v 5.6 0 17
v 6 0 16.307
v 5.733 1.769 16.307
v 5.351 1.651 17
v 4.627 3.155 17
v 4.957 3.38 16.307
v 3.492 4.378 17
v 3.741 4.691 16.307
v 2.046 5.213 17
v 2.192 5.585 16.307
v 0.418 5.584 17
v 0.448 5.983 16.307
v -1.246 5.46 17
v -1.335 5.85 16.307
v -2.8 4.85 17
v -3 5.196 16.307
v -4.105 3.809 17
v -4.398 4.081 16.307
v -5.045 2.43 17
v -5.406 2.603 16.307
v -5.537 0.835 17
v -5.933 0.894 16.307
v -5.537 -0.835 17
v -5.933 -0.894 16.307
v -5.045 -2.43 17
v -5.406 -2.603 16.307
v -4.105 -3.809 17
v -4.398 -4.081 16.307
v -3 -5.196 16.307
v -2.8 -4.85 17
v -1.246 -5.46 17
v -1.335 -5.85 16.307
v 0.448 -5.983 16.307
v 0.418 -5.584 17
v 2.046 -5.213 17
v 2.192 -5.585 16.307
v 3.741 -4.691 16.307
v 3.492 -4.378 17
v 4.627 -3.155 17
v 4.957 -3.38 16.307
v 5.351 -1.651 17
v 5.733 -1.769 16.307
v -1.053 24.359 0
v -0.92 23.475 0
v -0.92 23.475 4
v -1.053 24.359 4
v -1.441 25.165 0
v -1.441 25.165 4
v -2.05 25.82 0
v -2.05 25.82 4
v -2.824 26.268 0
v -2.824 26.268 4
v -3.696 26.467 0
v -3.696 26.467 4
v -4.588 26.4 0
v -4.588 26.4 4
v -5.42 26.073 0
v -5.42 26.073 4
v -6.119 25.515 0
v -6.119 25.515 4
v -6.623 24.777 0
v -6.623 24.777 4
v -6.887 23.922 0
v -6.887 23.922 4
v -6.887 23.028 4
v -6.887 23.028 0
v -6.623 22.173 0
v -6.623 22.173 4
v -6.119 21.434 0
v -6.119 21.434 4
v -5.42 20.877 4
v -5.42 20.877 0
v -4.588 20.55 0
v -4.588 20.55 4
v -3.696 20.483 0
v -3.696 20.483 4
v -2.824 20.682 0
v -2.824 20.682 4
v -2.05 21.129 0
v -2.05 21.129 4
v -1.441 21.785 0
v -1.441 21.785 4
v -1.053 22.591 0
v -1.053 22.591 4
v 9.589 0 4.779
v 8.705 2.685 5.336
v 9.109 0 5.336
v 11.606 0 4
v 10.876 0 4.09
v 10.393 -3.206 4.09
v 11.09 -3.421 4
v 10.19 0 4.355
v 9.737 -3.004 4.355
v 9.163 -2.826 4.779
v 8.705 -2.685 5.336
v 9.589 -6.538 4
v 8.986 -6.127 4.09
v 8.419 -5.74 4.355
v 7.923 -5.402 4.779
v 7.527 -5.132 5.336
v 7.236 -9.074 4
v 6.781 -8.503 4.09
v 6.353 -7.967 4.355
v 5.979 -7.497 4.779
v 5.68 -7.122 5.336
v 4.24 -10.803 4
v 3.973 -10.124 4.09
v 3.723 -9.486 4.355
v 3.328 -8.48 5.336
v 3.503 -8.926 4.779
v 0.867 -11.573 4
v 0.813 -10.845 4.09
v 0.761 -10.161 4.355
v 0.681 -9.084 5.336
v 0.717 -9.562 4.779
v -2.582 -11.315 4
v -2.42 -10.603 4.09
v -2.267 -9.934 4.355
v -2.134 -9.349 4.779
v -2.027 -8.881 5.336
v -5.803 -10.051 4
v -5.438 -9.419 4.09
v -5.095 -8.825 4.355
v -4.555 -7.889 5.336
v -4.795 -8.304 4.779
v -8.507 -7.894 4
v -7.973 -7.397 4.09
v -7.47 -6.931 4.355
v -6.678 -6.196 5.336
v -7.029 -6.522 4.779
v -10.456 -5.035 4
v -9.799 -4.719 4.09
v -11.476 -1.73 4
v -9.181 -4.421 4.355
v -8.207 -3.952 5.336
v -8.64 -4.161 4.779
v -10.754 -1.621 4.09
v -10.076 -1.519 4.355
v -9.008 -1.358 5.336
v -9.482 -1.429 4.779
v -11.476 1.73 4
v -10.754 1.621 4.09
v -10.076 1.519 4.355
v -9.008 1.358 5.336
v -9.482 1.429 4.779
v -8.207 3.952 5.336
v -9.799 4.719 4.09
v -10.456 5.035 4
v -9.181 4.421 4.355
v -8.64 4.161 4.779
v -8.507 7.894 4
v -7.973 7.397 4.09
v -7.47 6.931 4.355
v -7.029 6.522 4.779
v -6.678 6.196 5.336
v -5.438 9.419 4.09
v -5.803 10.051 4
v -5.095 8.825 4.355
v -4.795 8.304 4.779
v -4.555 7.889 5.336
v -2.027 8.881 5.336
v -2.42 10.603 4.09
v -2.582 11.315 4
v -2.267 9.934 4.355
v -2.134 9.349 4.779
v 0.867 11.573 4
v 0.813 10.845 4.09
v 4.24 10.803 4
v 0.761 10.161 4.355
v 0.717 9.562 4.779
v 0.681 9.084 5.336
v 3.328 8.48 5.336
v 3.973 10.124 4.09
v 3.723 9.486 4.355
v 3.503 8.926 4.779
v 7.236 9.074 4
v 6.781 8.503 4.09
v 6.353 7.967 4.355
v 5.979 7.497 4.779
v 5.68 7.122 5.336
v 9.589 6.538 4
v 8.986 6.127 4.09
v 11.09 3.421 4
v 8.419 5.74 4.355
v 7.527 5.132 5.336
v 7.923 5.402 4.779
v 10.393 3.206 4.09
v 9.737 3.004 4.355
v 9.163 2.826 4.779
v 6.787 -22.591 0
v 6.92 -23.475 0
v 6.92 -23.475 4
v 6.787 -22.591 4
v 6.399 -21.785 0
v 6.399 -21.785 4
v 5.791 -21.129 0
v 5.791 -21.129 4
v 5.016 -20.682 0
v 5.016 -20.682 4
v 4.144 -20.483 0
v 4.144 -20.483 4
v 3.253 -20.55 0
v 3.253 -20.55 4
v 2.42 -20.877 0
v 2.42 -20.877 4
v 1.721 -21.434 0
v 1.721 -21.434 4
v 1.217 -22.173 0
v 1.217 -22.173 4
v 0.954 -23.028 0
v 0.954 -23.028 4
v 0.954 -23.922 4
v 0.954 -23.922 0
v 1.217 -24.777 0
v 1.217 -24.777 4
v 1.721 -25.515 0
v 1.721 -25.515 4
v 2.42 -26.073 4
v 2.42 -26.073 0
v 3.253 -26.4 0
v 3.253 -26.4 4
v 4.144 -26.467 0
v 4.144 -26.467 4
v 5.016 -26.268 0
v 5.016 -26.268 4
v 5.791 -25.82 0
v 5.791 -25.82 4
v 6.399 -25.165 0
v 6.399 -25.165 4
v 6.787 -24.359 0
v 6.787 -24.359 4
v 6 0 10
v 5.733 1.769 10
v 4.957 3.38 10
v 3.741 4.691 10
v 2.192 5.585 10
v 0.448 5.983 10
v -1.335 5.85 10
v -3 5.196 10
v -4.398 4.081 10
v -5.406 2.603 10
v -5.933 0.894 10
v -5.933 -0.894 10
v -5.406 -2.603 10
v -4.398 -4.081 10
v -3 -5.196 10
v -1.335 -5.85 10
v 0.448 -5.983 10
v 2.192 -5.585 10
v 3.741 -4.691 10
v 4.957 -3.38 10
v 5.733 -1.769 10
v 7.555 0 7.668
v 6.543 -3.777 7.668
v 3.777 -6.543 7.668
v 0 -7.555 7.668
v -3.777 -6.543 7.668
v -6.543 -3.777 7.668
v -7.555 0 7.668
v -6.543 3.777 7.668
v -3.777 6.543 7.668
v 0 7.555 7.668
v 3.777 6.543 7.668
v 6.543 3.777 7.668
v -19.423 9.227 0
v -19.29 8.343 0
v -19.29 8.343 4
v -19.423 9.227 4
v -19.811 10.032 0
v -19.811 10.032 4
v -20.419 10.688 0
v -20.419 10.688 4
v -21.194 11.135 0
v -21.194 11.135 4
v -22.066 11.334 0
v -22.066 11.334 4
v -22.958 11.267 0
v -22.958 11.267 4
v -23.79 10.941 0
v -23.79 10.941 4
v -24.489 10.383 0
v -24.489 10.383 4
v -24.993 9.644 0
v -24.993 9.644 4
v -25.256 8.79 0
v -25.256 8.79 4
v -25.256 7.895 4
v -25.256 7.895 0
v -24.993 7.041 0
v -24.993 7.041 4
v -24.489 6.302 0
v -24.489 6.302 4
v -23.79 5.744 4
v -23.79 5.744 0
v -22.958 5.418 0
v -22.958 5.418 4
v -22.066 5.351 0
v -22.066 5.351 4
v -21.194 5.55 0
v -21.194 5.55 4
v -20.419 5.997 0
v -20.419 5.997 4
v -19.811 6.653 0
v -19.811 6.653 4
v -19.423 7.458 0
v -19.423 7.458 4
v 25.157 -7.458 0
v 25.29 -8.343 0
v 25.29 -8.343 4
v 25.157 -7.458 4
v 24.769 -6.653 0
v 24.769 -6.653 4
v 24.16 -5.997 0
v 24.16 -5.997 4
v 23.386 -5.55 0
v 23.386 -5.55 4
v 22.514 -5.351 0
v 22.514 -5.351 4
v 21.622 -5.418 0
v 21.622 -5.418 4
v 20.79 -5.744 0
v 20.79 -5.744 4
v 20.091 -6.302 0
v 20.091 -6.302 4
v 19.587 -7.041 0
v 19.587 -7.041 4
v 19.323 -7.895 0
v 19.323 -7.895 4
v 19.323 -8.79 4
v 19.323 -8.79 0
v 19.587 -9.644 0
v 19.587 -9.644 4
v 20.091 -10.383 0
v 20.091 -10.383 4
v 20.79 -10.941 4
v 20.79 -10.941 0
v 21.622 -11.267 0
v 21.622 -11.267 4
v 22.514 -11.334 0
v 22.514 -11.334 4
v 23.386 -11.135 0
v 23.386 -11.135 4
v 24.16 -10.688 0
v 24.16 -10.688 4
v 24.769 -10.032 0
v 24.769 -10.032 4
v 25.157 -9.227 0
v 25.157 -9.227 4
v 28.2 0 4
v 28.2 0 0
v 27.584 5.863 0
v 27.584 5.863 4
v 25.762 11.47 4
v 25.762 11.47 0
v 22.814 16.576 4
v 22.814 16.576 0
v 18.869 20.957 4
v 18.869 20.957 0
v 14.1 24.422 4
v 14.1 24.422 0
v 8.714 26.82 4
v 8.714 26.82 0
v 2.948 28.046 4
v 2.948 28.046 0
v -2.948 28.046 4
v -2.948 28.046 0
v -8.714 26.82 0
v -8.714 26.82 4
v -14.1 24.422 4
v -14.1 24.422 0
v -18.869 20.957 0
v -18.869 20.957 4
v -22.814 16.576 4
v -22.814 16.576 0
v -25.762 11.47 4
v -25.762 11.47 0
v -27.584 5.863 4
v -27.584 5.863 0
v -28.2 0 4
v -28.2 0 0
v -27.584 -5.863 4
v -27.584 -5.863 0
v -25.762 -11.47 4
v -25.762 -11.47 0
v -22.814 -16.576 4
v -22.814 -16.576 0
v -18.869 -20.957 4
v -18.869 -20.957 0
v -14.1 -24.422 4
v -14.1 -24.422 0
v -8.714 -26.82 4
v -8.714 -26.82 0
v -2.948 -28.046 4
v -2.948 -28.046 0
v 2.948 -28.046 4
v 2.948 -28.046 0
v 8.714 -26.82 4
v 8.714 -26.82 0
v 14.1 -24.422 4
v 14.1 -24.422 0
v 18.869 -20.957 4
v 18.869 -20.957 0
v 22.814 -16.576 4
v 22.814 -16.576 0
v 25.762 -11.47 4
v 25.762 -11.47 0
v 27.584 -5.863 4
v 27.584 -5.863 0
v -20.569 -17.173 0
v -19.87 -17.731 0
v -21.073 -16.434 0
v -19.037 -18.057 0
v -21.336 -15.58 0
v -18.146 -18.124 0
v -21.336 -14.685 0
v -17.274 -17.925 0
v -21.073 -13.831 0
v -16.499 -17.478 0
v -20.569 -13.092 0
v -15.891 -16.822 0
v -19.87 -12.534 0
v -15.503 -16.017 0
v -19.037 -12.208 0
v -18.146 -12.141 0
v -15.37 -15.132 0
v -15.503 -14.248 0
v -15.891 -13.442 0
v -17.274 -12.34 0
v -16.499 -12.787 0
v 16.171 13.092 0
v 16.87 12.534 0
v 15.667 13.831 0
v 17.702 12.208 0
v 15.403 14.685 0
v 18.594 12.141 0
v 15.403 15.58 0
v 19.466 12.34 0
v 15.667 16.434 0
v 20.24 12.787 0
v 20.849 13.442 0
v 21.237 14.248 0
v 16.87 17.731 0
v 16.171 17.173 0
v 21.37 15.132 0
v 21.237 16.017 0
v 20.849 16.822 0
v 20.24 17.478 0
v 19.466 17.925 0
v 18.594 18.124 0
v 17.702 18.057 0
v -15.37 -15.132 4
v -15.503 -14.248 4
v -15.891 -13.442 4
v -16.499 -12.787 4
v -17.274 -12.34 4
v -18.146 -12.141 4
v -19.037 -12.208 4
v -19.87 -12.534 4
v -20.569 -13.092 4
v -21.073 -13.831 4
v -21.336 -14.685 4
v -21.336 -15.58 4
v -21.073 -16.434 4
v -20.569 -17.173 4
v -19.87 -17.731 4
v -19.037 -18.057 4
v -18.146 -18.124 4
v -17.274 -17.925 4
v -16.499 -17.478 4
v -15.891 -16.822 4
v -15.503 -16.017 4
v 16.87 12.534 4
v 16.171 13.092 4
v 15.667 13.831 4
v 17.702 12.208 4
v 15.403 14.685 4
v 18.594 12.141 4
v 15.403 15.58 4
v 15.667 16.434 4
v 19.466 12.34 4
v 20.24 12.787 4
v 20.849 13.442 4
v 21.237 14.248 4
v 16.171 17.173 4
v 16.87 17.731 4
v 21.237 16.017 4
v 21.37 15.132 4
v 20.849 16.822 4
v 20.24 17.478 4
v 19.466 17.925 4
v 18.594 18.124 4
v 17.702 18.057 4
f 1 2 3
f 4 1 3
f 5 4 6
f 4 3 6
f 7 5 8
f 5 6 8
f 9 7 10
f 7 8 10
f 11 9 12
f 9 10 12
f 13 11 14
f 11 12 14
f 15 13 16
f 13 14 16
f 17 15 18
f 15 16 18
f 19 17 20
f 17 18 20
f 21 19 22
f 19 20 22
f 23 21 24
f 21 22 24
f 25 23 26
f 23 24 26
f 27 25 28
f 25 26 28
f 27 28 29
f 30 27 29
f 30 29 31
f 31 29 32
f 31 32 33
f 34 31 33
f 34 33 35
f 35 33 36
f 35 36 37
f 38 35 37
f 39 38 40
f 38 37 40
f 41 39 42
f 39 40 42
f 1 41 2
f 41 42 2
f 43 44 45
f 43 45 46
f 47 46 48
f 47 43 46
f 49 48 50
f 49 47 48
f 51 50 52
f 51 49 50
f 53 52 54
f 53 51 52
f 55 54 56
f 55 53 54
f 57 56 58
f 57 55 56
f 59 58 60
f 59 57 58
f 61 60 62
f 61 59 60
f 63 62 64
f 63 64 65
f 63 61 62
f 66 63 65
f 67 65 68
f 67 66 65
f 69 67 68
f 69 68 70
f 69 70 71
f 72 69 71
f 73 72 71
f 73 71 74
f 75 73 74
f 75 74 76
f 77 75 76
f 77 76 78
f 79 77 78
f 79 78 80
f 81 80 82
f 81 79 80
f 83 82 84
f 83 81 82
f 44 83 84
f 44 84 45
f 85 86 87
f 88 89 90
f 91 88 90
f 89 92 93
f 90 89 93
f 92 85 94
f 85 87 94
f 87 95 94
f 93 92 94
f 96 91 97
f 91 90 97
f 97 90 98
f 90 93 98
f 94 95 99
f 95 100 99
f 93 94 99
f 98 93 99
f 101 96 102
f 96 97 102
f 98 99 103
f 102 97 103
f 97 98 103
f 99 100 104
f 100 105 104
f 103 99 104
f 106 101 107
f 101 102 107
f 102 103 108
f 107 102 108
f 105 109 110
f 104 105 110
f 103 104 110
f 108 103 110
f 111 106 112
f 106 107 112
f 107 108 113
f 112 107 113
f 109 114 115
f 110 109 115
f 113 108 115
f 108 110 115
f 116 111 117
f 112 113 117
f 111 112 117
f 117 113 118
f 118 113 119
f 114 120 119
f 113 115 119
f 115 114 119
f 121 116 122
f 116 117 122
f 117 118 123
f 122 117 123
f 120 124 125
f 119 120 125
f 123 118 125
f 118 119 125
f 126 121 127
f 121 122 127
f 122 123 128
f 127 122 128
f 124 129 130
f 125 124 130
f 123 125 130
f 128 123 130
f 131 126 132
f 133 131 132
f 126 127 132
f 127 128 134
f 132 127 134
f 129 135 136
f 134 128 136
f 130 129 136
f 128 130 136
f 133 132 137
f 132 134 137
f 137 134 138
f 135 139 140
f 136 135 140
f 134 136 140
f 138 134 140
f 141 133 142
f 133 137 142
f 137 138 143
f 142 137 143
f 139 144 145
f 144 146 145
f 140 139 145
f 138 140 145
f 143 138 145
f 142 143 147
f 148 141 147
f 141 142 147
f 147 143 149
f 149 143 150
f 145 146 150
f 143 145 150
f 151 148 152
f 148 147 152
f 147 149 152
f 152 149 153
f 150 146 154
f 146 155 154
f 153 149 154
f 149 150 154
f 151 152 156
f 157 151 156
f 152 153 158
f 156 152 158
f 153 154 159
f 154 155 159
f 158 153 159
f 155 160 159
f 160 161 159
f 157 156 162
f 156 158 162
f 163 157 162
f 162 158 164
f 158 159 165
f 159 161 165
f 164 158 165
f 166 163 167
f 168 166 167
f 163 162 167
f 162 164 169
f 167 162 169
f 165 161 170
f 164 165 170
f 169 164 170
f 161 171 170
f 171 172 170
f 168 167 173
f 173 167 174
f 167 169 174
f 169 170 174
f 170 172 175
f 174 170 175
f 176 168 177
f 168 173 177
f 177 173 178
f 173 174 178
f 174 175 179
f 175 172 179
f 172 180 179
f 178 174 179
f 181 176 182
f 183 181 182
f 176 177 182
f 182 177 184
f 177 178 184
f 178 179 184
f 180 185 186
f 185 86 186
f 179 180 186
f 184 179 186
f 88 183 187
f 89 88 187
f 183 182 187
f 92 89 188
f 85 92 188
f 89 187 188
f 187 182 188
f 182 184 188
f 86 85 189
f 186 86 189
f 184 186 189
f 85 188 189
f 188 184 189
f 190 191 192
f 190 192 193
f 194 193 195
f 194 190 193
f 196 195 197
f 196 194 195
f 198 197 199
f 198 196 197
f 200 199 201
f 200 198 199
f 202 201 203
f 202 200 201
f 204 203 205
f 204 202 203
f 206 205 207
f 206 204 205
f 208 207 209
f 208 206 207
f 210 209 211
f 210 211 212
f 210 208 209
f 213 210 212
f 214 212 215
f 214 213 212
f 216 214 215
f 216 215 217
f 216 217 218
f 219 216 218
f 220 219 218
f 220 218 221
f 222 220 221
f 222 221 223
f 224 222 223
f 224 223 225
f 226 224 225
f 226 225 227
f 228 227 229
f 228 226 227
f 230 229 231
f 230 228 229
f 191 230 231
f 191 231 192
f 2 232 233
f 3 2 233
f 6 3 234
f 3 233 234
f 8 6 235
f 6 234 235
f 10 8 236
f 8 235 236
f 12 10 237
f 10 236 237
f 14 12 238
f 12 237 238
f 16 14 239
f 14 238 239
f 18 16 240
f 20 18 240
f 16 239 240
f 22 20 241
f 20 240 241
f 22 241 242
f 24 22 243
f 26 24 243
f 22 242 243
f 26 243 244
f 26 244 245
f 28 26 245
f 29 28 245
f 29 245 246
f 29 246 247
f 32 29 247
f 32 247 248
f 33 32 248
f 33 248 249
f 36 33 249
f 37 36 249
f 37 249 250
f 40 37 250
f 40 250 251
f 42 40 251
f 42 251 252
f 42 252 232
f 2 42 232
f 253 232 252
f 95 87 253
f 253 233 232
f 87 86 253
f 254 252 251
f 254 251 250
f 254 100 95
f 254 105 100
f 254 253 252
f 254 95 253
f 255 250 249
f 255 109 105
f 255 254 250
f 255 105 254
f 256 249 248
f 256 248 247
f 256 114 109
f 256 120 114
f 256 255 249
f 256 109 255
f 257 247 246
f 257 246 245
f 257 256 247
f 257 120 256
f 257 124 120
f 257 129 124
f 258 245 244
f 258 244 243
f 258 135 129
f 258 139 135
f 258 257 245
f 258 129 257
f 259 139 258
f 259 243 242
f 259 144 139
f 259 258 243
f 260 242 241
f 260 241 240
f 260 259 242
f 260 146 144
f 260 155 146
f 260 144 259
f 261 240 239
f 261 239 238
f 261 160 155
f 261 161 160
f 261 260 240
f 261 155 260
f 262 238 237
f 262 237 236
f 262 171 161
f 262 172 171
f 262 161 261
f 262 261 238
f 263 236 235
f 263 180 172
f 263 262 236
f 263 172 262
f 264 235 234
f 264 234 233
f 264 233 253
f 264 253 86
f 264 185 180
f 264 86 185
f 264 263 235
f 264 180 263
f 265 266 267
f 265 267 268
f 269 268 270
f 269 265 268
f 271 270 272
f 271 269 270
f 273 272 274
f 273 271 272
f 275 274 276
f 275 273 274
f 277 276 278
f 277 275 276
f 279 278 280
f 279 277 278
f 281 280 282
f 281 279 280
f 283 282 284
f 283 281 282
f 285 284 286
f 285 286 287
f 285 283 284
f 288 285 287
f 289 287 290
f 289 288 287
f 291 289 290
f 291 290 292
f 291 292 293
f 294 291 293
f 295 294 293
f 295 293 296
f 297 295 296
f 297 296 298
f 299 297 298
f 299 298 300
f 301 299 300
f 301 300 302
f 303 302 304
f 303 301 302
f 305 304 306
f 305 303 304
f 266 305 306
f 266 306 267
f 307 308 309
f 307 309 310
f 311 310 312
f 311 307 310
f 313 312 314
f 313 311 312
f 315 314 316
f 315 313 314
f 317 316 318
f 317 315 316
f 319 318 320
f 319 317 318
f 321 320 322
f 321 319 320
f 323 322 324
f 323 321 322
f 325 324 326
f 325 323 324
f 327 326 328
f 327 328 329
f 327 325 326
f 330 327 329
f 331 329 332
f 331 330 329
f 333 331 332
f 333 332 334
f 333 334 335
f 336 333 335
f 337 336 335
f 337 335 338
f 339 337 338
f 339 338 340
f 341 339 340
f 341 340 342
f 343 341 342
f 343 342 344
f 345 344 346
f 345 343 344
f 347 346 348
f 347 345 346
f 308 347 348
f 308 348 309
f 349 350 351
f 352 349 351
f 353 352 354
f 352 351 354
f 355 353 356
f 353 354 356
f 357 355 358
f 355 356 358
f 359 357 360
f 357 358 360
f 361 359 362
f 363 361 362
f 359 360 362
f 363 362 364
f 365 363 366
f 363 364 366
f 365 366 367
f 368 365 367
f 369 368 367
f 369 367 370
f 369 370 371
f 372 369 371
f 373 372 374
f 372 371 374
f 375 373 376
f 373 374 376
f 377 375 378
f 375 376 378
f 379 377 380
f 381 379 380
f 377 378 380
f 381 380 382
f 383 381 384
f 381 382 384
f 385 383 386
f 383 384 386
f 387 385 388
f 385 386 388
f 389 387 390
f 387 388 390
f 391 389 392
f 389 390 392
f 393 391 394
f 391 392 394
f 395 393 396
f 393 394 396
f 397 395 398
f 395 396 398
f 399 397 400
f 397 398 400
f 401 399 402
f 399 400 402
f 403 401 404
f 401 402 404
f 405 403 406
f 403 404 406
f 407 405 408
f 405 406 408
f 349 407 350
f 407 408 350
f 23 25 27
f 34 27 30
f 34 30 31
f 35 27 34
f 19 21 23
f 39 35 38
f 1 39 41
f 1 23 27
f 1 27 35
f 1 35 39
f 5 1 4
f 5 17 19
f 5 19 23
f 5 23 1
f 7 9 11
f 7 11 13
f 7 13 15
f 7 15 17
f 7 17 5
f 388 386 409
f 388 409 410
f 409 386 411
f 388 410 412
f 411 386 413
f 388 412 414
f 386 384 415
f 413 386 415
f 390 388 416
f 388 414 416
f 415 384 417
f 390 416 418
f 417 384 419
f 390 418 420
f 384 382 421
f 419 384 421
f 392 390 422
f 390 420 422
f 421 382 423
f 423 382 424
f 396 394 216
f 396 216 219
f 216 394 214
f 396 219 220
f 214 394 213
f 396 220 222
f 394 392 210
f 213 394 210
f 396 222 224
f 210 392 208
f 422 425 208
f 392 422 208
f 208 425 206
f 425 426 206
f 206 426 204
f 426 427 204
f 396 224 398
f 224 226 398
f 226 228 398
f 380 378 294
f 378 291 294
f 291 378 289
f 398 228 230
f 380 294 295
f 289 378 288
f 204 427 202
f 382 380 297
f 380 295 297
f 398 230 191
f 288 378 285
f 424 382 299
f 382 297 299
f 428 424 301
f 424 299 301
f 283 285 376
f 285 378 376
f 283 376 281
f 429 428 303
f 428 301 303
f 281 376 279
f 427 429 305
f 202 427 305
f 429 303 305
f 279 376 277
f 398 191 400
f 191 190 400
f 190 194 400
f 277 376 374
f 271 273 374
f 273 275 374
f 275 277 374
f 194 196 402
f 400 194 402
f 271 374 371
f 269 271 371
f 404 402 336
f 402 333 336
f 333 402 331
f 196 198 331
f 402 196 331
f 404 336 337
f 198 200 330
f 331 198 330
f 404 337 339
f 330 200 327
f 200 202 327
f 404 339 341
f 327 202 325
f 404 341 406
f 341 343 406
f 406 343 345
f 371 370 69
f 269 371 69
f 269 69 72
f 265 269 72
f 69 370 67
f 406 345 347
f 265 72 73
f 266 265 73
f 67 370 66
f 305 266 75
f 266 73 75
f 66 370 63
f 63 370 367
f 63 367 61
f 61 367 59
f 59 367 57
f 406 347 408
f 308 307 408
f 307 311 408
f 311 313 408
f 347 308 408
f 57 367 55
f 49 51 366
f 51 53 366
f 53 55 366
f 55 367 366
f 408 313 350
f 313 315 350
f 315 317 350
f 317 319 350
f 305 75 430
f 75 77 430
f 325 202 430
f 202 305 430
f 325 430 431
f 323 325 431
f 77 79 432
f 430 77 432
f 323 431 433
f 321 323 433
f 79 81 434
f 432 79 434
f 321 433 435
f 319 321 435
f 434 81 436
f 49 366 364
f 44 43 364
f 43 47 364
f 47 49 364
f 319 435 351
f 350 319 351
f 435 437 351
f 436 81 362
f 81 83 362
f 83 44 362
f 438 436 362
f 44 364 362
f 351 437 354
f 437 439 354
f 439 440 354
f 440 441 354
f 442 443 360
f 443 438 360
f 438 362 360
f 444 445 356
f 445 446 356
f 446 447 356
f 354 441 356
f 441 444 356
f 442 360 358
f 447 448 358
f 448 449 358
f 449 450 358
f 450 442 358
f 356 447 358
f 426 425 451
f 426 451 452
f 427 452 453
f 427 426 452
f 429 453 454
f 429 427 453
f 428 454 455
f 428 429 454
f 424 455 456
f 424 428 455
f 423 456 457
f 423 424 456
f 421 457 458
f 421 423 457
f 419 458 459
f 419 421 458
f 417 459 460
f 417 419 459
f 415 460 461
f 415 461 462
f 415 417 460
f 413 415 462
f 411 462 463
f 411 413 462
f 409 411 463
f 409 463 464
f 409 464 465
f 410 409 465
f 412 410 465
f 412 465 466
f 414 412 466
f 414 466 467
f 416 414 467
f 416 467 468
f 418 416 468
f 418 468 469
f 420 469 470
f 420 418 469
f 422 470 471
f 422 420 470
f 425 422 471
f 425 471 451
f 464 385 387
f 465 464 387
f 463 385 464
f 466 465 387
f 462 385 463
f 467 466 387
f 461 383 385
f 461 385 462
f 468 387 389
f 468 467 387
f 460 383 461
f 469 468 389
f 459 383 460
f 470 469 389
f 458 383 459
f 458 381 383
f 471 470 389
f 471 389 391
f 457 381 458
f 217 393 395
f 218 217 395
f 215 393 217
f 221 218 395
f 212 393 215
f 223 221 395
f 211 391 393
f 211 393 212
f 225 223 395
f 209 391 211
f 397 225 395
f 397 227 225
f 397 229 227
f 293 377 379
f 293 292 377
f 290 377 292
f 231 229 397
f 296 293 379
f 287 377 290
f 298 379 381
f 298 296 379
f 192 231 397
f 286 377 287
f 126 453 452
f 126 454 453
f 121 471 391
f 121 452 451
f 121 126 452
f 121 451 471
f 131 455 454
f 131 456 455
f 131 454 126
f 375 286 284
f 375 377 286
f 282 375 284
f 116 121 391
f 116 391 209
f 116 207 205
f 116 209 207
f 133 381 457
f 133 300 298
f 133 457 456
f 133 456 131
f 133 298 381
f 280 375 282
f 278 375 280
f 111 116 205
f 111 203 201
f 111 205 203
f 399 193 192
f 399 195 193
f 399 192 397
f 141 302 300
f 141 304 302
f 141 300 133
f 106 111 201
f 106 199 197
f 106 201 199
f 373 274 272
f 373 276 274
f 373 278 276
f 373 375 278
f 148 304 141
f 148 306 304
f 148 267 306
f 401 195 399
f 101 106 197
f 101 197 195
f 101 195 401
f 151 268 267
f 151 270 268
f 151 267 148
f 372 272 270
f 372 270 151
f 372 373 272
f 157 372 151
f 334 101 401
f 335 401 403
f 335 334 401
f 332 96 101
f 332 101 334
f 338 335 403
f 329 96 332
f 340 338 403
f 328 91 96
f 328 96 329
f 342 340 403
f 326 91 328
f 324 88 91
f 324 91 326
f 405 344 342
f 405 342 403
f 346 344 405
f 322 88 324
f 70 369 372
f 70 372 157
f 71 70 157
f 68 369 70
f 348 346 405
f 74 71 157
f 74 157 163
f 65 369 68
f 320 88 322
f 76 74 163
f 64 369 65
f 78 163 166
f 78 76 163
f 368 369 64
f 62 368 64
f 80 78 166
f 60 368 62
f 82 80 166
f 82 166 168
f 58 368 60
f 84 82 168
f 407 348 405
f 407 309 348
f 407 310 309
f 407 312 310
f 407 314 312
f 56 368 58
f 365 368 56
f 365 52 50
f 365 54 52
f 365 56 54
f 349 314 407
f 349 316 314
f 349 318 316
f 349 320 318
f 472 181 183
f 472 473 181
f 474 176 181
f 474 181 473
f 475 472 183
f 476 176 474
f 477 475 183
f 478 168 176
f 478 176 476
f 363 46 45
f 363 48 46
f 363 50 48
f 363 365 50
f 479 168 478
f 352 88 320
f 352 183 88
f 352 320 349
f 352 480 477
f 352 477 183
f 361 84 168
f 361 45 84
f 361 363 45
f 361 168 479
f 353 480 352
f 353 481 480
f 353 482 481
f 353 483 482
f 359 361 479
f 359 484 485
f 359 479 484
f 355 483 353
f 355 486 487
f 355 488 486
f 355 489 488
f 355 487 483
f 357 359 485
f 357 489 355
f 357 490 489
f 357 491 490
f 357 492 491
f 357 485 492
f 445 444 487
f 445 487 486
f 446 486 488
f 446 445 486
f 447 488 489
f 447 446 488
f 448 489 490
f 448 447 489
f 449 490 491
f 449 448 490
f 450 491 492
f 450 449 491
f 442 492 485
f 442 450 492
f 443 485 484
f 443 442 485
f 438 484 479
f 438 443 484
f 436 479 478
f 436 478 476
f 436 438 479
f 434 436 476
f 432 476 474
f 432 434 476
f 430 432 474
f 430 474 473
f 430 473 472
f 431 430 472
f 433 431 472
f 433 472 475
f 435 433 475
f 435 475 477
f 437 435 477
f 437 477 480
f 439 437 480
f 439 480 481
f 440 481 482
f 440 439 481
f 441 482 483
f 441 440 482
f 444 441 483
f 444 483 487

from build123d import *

# Parameters (mm, degrees)
SKETCH1_R           = 28.2
SKETCH1_R_2         = 3
BOSS_EXTRUDE1_DEPTH = 4
SKETCH1_5_R         = 6
BOSS_EXTRUDE3_DEPTH = 17
CHAMFER1_SIZE       = 6
CHAMFER1_SIZE2      = 4
FILLET3_R           = 3
CHAMFER3_SIZE       = 0.4
CHAMFER3_SIZE2      = 0.692820323


with BuildPart() as part:
    # Sketch1 → Boss-Extrude1 (new body)
    with BuildSketch(Plane.XY):
        Circle(SKETCH1_R)
        with Locations((-22.289967255, 8.342503208)):
            Circle(SKETCH1_R_2, mode=Mode.SUBTRACT)
        with Locations((-3.920163919, 23.474929496)):
            Circle(SKETCH1_R_2, mode=Mode.SUBTRACT)
        with Locations((18.369803336, 15.132426289)):
            Circle(SKETCH1_R_2, mode=Mode.SUBTRACT)
        with Locations((22.289967255, -8.342503208)):
            Circle(SKETCH1_R_2, mode=Mode.SUBTRACT)
        with Locations((3.920163919, -23.474929496)):
            Circle(SKETCH1_R_2, mode=Mode.SUBTRACT)
        with Locations((-18.369803336, -15.132426289)):
            Circle(SKETCH1_R_2, mode=Mode.SUBTRACT)
    extrude(amount=BOSS_EXTRUDE1_DEPTH)

    # Sketch1<5> → Boss-Extrude3 (add)
    with BuildSketch(Plane.XY):
        Circle(SKETCH1_5_R)
    extrude(amount=BOSS_EXTRUDE3_DEPTH)

    # Chamfer1
    chamfer1_edges = [part.edges().sort_by_distance(p)[0] for p in [
        (-6, 0, 4),
    ]]
    chamfer1_side = [part.faces().sort_by_distance(p)[0] for p in [
        (-6, 0, 10.5),
    ]]
    chamfer(chamfer1_edges, length=CHAMFER1_SIZE, length2=CHAMFER1_SIZE2, reference=chamfer1_side[0])

    # Fillet3
    fillet3_edges = [part.edges().sort_by_distance(p)[0] for p in [
        (-10, 0, 4),
    ]]
    fillet(fillet3_edges, radius=FILLET3_R)

    # Chamfer3
    chamfer3_edges = [part.edges().sort_by_distance(p)[0] for p in [
        (-6, 0, 17),
    ]]
    chamfer3_side = [part.faces().sort_by_distance(p)[0] for p in [
        (0, 0, 17),
    ]]
    chamfer(chamfer3_edges, length=CHAMFER3_SIZE, length2=CHAMFER3_SIZE2, reference=chamfer3_side[0])


solid = part.part
